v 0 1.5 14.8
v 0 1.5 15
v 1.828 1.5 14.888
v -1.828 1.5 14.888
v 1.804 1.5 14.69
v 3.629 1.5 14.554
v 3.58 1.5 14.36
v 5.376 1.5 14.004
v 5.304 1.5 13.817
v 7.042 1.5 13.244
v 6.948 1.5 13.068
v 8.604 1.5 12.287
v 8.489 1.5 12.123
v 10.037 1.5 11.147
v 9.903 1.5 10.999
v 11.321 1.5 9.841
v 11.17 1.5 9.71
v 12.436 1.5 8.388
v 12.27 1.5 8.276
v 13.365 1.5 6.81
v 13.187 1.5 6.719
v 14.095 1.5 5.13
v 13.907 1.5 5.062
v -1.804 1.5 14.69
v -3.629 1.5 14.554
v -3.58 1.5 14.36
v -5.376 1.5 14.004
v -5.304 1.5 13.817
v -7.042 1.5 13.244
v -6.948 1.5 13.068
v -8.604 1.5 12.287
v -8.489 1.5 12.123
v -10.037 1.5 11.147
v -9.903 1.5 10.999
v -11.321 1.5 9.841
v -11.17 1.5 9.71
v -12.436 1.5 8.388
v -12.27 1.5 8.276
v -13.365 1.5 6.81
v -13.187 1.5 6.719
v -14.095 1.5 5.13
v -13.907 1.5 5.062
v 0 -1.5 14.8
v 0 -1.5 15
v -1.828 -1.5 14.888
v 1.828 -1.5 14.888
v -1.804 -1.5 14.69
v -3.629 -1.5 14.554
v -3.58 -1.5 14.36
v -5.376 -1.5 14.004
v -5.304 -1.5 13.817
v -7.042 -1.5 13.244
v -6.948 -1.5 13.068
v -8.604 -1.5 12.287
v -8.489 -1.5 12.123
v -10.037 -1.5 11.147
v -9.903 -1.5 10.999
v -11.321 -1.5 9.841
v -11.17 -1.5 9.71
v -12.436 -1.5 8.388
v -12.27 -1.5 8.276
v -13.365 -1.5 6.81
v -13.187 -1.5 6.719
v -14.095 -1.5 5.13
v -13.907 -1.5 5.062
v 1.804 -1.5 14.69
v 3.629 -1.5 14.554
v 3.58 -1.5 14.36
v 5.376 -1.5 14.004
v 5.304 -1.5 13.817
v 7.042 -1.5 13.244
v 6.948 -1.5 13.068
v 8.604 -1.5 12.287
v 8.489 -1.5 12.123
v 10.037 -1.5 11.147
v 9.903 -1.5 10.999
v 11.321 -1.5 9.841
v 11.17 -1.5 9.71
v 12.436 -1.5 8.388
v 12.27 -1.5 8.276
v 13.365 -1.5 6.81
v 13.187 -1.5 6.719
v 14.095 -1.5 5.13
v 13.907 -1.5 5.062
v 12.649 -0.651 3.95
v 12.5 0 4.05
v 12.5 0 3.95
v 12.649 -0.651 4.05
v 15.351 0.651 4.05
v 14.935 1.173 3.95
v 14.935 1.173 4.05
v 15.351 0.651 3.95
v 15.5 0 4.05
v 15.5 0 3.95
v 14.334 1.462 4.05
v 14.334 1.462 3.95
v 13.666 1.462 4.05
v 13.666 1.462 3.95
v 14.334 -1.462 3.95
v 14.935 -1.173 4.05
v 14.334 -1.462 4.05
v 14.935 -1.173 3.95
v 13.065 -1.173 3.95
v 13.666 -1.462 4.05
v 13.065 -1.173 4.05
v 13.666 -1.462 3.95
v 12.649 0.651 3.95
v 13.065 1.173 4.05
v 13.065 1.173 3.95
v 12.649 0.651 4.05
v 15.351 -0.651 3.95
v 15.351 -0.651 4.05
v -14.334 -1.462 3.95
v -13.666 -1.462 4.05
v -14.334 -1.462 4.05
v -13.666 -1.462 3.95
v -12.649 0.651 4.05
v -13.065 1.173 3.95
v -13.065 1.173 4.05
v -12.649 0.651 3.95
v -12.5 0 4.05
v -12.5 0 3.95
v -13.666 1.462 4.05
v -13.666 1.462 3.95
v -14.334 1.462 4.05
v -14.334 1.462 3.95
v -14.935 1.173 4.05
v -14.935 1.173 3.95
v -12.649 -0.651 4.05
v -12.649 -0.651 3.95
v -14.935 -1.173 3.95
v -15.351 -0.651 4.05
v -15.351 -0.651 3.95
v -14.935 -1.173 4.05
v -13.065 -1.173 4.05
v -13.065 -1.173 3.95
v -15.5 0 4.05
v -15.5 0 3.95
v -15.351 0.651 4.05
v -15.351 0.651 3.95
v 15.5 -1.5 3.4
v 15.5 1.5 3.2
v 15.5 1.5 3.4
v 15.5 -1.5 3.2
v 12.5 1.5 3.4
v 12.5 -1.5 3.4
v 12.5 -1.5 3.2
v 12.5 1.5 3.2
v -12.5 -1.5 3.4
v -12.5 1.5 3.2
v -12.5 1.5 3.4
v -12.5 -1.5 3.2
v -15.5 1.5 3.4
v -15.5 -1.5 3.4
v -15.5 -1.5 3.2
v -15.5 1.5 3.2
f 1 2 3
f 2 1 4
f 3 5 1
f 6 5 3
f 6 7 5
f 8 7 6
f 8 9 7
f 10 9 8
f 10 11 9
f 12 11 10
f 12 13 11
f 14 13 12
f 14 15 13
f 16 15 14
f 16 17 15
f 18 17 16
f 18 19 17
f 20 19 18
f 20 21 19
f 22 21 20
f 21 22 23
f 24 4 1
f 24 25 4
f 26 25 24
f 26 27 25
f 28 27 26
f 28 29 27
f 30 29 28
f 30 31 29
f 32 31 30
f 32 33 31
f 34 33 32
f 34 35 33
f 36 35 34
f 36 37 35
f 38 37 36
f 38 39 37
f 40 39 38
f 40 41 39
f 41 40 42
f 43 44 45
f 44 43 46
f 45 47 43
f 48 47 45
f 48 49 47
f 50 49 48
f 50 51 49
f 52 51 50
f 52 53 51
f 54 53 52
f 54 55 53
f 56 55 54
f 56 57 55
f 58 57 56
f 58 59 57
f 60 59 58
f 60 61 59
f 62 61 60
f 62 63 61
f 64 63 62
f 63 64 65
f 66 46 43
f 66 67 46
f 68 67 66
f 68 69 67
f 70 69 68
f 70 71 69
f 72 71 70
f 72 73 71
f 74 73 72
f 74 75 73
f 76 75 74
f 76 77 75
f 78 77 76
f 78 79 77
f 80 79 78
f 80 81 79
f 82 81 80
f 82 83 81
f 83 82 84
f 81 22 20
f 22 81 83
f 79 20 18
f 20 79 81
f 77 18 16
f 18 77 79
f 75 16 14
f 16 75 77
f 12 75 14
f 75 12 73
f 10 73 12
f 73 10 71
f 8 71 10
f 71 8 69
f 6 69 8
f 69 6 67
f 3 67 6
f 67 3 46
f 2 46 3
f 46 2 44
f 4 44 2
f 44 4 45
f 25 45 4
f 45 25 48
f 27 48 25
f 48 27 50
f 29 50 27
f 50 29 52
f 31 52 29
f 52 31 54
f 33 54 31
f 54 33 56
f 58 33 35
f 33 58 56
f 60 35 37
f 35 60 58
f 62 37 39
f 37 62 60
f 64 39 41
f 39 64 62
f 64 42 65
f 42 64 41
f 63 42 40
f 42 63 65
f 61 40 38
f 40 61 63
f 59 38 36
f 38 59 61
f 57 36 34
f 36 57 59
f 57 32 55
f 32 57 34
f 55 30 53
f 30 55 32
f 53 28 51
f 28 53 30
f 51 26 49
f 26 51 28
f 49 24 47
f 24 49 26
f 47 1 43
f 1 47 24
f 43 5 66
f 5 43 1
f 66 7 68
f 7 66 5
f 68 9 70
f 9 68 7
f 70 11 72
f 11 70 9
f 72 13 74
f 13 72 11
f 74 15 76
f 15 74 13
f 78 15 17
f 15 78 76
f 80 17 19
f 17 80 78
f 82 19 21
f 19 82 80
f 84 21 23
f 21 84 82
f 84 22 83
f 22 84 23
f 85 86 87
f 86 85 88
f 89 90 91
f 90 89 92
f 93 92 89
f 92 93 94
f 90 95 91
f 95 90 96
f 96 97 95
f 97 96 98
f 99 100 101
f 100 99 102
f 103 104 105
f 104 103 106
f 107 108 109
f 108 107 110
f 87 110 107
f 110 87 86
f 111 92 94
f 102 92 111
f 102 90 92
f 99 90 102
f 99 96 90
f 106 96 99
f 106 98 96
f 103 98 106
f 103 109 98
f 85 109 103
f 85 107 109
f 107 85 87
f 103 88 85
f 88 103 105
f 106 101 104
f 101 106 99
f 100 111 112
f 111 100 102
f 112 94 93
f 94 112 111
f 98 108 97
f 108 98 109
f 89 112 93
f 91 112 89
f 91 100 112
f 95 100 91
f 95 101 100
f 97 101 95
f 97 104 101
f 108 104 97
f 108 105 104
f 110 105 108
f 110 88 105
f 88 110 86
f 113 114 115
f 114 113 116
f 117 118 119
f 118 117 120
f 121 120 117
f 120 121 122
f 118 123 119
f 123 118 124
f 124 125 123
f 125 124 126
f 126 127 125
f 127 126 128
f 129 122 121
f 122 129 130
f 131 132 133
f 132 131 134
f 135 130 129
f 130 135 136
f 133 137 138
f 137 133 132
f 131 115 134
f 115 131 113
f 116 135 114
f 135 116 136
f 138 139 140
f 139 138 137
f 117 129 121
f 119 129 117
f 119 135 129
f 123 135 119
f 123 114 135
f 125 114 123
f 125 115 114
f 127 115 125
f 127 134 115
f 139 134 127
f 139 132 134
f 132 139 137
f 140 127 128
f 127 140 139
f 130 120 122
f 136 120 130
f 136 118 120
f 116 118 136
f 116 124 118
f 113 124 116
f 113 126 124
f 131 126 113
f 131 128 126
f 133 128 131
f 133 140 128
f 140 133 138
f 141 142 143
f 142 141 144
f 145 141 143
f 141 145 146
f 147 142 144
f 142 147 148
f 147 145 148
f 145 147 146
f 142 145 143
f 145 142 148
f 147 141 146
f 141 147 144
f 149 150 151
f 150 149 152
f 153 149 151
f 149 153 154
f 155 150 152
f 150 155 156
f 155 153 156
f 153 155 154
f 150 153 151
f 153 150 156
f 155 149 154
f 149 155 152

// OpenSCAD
temple_lintel();

module temple_lintel() {
 


color("DodgerBlue")
translate([0,0,0])
rotate([90,0,0])        // rotate the *3D solid*
    linear_extrude(height=3, center=true)
        arc_band(
            r_outer = 15,
            r_inner = 14.8,
            a0 = 20,
            a1 = 160,
            steps = 20
        );



color("DarkOrange")
translate([14,0,4])
cylinder(0.1, 1.5, 1.5, $fn=14,center=true);

color("DarkOrange")
translate([-14,0,4])
cylinder(0.1, 1.5, 1.5, $fn=14,center=true);

color("khaki")
translate([14,0,3.3])
cube([3, 3, 0.2], center=true);

color("khaki")
translate([-14,0,3.3])
cube([3, 3, 0.2], center=true);
}



function arc_points(r, a0, a1, steps=64) =
    [ for (i=[0:steps])
        let(a = a0 + (a1-a0)*i/steps)
        [r*cos(a), r*sin(a)]
    ];


module arc_band(r_outer, r_inner, a0, a1, steps=64) {
    polygon(
        concat(
            arc_points(r_outer, a0, a1, steps),
            [ for (i = [steps : -1 : 0])
                arc_points(r_inner, a0, a1, steps)[i]
            ]
        )
    );
}
